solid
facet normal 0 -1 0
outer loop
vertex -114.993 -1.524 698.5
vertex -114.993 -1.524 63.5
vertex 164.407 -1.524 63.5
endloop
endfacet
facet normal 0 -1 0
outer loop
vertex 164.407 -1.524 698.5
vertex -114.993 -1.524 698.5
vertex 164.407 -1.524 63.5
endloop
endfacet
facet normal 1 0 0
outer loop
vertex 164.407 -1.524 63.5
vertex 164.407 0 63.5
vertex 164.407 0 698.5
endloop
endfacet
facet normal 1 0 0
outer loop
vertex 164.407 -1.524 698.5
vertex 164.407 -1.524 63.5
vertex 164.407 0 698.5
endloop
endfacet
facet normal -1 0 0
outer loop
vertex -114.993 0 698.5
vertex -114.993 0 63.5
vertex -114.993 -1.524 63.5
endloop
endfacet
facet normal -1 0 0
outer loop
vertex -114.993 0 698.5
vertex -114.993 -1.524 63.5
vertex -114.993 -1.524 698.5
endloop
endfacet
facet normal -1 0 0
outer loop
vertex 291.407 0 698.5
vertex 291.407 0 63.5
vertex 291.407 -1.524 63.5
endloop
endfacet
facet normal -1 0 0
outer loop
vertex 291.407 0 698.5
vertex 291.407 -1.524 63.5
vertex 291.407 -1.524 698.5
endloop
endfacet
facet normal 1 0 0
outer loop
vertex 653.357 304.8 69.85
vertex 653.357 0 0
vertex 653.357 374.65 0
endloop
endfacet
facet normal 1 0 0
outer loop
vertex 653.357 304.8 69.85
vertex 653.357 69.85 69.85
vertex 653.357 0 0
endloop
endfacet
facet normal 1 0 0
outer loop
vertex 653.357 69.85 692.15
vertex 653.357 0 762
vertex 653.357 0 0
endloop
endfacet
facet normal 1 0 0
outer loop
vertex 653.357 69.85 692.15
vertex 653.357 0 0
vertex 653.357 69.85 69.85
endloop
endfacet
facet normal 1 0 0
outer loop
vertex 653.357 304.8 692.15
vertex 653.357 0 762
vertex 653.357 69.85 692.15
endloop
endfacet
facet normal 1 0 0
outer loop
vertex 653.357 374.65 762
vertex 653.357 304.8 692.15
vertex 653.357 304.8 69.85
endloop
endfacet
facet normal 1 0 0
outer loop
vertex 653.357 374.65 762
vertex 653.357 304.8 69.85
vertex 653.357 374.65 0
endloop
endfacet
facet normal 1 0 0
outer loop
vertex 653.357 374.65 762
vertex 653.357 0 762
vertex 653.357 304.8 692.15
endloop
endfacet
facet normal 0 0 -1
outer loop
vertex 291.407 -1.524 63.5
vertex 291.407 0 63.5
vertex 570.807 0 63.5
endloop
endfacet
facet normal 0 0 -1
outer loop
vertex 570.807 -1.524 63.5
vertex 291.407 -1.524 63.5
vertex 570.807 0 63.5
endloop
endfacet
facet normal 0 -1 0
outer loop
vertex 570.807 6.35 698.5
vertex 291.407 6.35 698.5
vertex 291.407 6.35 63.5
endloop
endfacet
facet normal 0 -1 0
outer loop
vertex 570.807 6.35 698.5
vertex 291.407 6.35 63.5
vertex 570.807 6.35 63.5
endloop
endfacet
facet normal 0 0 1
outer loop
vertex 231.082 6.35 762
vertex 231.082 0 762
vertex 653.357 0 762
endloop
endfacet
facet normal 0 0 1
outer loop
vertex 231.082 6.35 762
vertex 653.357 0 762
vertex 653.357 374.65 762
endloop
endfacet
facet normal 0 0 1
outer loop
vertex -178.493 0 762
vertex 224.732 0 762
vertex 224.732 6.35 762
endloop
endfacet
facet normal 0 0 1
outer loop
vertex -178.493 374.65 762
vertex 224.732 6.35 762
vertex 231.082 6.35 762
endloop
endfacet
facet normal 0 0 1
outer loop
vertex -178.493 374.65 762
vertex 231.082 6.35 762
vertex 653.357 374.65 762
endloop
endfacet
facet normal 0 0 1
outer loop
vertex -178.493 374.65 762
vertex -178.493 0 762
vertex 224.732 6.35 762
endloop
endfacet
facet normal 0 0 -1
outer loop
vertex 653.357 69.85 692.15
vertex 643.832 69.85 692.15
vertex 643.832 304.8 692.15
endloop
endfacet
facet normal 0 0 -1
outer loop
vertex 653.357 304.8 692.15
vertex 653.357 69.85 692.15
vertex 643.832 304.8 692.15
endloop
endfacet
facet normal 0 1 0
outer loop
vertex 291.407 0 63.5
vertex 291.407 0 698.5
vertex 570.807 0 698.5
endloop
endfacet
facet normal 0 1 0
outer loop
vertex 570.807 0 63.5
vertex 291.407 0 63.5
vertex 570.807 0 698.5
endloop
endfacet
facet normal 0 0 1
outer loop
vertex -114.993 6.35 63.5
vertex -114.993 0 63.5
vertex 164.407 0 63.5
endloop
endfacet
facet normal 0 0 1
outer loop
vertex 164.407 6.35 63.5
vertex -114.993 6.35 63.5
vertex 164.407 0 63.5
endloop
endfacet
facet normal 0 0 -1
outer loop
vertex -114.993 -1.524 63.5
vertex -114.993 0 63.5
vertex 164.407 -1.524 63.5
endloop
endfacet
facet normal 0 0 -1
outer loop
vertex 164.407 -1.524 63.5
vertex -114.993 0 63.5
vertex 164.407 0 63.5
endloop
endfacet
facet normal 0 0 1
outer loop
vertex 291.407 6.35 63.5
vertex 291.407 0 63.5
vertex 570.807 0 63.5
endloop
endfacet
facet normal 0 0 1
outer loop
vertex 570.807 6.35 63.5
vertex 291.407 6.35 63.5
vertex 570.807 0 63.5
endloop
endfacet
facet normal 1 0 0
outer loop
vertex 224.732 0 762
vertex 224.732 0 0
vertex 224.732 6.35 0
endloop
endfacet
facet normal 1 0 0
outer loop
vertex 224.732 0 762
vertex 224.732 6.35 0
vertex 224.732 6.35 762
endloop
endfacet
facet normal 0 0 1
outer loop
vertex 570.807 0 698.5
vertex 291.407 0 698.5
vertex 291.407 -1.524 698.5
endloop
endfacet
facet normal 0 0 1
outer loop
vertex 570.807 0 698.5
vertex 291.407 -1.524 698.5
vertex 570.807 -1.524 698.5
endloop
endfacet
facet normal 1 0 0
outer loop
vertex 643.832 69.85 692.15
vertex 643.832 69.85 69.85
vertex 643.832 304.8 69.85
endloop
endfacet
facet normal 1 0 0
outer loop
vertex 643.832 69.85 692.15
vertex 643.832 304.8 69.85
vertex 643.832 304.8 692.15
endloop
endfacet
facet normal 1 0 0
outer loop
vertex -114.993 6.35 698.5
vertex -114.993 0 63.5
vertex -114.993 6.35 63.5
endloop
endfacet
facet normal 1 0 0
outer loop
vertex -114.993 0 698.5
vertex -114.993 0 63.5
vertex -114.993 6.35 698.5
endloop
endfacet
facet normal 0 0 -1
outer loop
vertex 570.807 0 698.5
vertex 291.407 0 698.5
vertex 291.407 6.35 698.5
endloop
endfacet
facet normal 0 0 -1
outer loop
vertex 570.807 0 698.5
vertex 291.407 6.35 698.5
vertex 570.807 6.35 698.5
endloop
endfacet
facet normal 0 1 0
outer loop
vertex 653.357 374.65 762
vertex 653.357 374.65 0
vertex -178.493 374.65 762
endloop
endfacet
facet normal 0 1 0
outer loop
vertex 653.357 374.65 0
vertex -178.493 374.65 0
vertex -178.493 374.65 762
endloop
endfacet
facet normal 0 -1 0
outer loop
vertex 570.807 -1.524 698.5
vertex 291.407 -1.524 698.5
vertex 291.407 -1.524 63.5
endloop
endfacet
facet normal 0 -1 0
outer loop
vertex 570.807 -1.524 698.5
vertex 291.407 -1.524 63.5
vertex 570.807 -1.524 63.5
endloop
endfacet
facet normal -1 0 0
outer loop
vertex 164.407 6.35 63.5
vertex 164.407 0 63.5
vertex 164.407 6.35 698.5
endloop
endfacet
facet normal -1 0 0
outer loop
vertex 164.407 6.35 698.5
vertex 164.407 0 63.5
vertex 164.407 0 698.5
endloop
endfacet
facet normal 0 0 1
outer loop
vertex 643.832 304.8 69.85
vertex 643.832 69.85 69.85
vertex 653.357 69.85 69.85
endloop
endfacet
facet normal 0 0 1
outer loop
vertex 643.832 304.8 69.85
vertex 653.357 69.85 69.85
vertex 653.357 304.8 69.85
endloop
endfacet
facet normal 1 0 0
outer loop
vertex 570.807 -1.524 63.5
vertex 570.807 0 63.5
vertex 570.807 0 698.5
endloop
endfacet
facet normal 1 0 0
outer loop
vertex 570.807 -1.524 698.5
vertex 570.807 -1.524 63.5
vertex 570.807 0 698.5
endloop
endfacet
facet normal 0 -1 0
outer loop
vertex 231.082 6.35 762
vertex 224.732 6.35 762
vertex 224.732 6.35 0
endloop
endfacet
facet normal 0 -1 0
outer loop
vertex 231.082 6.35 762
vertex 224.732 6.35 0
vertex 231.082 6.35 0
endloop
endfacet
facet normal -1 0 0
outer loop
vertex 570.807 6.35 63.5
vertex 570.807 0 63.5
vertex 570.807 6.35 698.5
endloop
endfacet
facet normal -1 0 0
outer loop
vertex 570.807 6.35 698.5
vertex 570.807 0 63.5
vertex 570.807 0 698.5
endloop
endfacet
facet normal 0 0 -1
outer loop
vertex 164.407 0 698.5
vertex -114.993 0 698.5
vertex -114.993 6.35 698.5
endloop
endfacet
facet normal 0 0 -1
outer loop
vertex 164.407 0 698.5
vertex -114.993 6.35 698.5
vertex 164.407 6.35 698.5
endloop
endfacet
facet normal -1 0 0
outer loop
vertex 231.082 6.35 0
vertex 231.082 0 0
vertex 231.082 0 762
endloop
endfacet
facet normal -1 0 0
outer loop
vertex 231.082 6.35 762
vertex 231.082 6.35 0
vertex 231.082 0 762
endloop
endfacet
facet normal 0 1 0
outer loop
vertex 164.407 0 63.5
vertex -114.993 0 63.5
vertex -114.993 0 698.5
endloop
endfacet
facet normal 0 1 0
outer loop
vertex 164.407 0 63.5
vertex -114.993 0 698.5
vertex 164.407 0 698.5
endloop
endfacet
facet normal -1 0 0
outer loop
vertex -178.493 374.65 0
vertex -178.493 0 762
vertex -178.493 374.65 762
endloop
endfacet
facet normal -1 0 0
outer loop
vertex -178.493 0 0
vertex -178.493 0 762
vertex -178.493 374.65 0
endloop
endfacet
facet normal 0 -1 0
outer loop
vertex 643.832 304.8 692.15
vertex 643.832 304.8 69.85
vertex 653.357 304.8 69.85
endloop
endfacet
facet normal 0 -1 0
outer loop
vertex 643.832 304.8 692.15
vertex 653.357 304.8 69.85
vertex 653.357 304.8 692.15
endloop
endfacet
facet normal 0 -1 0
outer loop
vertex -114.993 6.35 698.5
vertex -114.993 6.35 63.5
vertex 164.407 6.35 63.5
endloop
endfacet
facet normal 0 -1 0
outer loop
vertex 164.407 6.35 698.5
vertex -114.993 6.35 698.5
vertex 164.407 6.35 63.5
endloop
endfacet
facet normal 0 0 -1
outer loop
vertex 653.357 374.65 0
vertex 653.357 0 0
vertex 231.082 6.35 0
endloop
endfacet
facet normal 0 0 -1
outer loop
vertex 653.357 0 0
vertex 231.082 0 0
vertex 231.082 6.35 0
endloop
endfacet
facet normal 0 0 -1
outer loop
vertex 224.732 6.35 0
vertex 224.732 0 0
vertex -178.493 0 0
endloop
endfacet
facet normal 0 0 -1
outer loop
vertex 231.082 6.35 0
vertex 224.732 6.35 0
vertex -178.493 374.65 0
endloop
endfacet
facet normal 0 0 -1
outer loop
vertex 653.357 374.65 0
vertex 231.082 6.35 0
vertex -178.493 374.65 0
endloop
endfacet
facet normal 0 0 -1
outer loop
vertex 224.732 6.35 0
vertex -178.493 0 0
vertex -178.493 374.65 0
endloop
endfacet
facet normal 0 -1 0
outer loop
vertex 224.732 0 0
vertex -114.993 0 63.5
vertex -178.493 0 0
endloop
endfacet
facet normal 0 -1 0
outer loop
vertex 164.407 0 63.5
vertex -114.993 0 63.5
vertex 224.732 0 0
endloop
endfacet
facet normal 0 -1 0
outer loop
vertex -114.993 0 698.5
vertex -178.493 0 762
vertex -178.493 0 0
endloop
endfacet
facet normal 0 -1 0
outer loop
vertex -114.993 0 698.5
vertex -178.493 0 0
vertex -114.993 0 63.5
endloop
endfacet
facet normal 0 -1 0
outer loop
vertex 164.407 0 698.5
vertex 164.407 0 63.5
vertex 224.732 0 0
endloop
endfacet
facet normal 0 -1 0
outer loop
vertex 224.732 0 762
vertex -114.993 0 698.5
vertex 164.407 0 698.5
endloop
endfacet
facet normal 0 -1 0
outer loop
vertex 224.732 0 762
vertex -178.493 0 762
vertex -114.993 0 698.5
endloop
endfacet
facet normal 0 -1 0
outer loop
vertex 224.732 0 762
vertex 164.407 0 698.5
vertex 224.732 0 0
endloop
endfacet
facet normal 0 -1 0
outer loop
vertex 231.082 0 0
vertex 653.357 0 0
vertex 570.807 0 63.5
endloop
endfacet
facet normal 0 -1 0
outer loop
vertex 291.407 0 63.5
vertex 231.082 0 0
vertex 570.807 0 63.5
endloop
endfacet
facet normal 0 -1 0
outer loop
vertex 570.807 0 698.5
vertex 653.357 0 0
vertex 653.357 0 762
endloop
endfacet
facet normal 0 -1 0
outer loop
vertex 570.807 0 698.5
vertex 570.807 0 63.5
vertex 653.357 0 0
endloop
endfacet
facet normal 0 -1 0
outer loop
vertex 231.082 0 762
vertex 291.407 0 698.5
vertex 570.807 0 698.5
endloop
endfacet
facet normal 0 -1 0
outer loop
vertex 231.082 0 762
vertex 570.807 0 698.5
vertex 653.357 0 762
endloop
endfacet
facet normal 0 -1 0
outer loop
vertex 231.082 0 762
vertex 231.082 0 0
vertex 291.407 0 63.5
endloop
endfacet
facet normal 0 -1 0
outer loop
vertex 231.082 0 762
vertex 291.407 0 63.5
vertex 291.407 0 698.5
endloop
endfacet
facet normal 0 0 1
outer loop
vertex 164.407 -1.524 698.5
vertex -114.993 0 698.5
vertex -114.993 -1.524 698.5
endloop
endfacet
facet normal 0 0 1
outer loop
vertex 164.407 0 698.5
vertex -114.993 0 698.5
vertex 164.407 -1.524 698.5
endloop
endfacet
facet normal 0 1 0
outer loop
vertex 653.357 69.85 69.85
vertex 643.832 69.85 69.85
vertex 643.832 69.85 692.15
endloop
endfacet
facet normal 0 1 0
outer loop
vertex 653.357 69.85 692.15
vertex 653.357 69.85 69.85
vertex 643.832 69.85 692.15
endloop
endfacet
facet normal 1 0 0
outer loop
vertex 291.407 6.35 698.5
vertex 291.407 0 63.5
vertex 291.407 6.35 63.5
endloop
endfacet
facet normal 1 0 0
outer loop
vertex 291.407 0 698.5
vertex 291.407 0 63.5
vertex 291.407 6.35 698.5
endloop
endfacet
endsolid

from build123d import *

# Parameters (mm, degrees)
F0_W     = 279.4
F0_H     = 635
F0_W_2   = 3.175
F0_H_2   = 762
F1_DEPTH = 374.65
F2_DEPTH = 6.35
F3_DEPTH = 1.524
F4_W     = 374.65
F4_H     = 762
F4_W_2   = 234.95
F4_H_2   = 622.3
F5_DEPTH = 19.05
F6_DEPTH = 9.525


# Not quite as in the source:
# - a feature names something its author has since deleted; it is built from what else it names


with BuildPart() as f1:
    # F0 (on Front) → F1 (new body)
    with BuildSketch(Plane.XZ):
        Polygon((-178.4927574873, 0), (224.7322425127, 0), (224.7322425127, 762), (151.7072425127, 762), (-178.4927574873, 762), align=None)
        with Locations((24.7072425127, 381)):
            Rectangle(F0_W, F0_H, mode=Mode.SUBTRACT)
        Polygon((231.0822425127, 762), (231.0822425127, 0), (634.3072425127, 0), (634.3072425127, 762), (304.1072425127, 762), align=None)
        with Locations((431.1072425127, 381)):
            Rectangle(F0_W, F0_H, mode=Mode.SUBTRACT)
        with Locations((24.7072425127, 381)):
            Rectangle(F0_W, F0_H)
        with Locations((431.1072425127, 381)):
            Rectangle(F0_W, F0_H)
        with Locations((226.3197425127, 381)):
            Rectangle(F0_W_2, F0_H_2)
        with Locations((229.4947425127, 381)):
            Rectangle(F0_W_2, F0_H_2)
    extrude(amount=-F1_DEPTH)

    # F0 (on Front) → F2 (cut)
    with BuildSketch(Plane.XZ):
        with Locations((226.3197425127, 381)):
            Rectangle(F0_W_2, F0_H_2)
        with Locations((229.4947425127, 381)):
            Rectangle(F0_W_2, F0_H_2)
        with Locations((24.7072425127, 381)):
            Rectangle(F0_W, F0_H)
        with Locations((431.1072425127, 381)):
            Rectangle(F0_W, F0_H)
    extrude(amount=-F2_DEPTH, mode=Mode.SUBTRACT)

    # F4 (on face) → F5 (join)
    with BuildSketch(Plane.YZ.offset(634.3072425127)):
        with Locations((187.325, 381)):
            Rectangle(F4_W, F4_H)
        with Locations((187.325, 381)):
            Rectangle(F4_W_2, F4_H_2, mode=Mode.SUBTRACT)
    extrude(amount=F5_DEPTH)

    # F6 (add): a face of the model
    f6_faces = [f1.faces().sort_by_distance(p)[0] for p in [
        (634.3072425127, 187.325, 381),
    ]]
    extrude(f6_faces, amount=F6_DEPTH)


with BuildPart() as f3:
    # F0 (on Front) → F3 (new body)
    with BuildSketch(Plane.XZ):
        with Locations((24.7072425127, 381)):
            Rectangle(F0_W, F0_H)
    extrude(amount=F3_DEPTH)


with BuildPart() as f3b:
    # F0 (on Front) → F3, piece 2 (new body)
    with BuildSketch(Plane.XZ):
        with Locations((431.1072425127, 381)):
            Rectangle(F0_W, F0_H)
    extrude(amount=F3_DEPTH)


solid = Compound([f1.part, f3.part, f3b.part])
